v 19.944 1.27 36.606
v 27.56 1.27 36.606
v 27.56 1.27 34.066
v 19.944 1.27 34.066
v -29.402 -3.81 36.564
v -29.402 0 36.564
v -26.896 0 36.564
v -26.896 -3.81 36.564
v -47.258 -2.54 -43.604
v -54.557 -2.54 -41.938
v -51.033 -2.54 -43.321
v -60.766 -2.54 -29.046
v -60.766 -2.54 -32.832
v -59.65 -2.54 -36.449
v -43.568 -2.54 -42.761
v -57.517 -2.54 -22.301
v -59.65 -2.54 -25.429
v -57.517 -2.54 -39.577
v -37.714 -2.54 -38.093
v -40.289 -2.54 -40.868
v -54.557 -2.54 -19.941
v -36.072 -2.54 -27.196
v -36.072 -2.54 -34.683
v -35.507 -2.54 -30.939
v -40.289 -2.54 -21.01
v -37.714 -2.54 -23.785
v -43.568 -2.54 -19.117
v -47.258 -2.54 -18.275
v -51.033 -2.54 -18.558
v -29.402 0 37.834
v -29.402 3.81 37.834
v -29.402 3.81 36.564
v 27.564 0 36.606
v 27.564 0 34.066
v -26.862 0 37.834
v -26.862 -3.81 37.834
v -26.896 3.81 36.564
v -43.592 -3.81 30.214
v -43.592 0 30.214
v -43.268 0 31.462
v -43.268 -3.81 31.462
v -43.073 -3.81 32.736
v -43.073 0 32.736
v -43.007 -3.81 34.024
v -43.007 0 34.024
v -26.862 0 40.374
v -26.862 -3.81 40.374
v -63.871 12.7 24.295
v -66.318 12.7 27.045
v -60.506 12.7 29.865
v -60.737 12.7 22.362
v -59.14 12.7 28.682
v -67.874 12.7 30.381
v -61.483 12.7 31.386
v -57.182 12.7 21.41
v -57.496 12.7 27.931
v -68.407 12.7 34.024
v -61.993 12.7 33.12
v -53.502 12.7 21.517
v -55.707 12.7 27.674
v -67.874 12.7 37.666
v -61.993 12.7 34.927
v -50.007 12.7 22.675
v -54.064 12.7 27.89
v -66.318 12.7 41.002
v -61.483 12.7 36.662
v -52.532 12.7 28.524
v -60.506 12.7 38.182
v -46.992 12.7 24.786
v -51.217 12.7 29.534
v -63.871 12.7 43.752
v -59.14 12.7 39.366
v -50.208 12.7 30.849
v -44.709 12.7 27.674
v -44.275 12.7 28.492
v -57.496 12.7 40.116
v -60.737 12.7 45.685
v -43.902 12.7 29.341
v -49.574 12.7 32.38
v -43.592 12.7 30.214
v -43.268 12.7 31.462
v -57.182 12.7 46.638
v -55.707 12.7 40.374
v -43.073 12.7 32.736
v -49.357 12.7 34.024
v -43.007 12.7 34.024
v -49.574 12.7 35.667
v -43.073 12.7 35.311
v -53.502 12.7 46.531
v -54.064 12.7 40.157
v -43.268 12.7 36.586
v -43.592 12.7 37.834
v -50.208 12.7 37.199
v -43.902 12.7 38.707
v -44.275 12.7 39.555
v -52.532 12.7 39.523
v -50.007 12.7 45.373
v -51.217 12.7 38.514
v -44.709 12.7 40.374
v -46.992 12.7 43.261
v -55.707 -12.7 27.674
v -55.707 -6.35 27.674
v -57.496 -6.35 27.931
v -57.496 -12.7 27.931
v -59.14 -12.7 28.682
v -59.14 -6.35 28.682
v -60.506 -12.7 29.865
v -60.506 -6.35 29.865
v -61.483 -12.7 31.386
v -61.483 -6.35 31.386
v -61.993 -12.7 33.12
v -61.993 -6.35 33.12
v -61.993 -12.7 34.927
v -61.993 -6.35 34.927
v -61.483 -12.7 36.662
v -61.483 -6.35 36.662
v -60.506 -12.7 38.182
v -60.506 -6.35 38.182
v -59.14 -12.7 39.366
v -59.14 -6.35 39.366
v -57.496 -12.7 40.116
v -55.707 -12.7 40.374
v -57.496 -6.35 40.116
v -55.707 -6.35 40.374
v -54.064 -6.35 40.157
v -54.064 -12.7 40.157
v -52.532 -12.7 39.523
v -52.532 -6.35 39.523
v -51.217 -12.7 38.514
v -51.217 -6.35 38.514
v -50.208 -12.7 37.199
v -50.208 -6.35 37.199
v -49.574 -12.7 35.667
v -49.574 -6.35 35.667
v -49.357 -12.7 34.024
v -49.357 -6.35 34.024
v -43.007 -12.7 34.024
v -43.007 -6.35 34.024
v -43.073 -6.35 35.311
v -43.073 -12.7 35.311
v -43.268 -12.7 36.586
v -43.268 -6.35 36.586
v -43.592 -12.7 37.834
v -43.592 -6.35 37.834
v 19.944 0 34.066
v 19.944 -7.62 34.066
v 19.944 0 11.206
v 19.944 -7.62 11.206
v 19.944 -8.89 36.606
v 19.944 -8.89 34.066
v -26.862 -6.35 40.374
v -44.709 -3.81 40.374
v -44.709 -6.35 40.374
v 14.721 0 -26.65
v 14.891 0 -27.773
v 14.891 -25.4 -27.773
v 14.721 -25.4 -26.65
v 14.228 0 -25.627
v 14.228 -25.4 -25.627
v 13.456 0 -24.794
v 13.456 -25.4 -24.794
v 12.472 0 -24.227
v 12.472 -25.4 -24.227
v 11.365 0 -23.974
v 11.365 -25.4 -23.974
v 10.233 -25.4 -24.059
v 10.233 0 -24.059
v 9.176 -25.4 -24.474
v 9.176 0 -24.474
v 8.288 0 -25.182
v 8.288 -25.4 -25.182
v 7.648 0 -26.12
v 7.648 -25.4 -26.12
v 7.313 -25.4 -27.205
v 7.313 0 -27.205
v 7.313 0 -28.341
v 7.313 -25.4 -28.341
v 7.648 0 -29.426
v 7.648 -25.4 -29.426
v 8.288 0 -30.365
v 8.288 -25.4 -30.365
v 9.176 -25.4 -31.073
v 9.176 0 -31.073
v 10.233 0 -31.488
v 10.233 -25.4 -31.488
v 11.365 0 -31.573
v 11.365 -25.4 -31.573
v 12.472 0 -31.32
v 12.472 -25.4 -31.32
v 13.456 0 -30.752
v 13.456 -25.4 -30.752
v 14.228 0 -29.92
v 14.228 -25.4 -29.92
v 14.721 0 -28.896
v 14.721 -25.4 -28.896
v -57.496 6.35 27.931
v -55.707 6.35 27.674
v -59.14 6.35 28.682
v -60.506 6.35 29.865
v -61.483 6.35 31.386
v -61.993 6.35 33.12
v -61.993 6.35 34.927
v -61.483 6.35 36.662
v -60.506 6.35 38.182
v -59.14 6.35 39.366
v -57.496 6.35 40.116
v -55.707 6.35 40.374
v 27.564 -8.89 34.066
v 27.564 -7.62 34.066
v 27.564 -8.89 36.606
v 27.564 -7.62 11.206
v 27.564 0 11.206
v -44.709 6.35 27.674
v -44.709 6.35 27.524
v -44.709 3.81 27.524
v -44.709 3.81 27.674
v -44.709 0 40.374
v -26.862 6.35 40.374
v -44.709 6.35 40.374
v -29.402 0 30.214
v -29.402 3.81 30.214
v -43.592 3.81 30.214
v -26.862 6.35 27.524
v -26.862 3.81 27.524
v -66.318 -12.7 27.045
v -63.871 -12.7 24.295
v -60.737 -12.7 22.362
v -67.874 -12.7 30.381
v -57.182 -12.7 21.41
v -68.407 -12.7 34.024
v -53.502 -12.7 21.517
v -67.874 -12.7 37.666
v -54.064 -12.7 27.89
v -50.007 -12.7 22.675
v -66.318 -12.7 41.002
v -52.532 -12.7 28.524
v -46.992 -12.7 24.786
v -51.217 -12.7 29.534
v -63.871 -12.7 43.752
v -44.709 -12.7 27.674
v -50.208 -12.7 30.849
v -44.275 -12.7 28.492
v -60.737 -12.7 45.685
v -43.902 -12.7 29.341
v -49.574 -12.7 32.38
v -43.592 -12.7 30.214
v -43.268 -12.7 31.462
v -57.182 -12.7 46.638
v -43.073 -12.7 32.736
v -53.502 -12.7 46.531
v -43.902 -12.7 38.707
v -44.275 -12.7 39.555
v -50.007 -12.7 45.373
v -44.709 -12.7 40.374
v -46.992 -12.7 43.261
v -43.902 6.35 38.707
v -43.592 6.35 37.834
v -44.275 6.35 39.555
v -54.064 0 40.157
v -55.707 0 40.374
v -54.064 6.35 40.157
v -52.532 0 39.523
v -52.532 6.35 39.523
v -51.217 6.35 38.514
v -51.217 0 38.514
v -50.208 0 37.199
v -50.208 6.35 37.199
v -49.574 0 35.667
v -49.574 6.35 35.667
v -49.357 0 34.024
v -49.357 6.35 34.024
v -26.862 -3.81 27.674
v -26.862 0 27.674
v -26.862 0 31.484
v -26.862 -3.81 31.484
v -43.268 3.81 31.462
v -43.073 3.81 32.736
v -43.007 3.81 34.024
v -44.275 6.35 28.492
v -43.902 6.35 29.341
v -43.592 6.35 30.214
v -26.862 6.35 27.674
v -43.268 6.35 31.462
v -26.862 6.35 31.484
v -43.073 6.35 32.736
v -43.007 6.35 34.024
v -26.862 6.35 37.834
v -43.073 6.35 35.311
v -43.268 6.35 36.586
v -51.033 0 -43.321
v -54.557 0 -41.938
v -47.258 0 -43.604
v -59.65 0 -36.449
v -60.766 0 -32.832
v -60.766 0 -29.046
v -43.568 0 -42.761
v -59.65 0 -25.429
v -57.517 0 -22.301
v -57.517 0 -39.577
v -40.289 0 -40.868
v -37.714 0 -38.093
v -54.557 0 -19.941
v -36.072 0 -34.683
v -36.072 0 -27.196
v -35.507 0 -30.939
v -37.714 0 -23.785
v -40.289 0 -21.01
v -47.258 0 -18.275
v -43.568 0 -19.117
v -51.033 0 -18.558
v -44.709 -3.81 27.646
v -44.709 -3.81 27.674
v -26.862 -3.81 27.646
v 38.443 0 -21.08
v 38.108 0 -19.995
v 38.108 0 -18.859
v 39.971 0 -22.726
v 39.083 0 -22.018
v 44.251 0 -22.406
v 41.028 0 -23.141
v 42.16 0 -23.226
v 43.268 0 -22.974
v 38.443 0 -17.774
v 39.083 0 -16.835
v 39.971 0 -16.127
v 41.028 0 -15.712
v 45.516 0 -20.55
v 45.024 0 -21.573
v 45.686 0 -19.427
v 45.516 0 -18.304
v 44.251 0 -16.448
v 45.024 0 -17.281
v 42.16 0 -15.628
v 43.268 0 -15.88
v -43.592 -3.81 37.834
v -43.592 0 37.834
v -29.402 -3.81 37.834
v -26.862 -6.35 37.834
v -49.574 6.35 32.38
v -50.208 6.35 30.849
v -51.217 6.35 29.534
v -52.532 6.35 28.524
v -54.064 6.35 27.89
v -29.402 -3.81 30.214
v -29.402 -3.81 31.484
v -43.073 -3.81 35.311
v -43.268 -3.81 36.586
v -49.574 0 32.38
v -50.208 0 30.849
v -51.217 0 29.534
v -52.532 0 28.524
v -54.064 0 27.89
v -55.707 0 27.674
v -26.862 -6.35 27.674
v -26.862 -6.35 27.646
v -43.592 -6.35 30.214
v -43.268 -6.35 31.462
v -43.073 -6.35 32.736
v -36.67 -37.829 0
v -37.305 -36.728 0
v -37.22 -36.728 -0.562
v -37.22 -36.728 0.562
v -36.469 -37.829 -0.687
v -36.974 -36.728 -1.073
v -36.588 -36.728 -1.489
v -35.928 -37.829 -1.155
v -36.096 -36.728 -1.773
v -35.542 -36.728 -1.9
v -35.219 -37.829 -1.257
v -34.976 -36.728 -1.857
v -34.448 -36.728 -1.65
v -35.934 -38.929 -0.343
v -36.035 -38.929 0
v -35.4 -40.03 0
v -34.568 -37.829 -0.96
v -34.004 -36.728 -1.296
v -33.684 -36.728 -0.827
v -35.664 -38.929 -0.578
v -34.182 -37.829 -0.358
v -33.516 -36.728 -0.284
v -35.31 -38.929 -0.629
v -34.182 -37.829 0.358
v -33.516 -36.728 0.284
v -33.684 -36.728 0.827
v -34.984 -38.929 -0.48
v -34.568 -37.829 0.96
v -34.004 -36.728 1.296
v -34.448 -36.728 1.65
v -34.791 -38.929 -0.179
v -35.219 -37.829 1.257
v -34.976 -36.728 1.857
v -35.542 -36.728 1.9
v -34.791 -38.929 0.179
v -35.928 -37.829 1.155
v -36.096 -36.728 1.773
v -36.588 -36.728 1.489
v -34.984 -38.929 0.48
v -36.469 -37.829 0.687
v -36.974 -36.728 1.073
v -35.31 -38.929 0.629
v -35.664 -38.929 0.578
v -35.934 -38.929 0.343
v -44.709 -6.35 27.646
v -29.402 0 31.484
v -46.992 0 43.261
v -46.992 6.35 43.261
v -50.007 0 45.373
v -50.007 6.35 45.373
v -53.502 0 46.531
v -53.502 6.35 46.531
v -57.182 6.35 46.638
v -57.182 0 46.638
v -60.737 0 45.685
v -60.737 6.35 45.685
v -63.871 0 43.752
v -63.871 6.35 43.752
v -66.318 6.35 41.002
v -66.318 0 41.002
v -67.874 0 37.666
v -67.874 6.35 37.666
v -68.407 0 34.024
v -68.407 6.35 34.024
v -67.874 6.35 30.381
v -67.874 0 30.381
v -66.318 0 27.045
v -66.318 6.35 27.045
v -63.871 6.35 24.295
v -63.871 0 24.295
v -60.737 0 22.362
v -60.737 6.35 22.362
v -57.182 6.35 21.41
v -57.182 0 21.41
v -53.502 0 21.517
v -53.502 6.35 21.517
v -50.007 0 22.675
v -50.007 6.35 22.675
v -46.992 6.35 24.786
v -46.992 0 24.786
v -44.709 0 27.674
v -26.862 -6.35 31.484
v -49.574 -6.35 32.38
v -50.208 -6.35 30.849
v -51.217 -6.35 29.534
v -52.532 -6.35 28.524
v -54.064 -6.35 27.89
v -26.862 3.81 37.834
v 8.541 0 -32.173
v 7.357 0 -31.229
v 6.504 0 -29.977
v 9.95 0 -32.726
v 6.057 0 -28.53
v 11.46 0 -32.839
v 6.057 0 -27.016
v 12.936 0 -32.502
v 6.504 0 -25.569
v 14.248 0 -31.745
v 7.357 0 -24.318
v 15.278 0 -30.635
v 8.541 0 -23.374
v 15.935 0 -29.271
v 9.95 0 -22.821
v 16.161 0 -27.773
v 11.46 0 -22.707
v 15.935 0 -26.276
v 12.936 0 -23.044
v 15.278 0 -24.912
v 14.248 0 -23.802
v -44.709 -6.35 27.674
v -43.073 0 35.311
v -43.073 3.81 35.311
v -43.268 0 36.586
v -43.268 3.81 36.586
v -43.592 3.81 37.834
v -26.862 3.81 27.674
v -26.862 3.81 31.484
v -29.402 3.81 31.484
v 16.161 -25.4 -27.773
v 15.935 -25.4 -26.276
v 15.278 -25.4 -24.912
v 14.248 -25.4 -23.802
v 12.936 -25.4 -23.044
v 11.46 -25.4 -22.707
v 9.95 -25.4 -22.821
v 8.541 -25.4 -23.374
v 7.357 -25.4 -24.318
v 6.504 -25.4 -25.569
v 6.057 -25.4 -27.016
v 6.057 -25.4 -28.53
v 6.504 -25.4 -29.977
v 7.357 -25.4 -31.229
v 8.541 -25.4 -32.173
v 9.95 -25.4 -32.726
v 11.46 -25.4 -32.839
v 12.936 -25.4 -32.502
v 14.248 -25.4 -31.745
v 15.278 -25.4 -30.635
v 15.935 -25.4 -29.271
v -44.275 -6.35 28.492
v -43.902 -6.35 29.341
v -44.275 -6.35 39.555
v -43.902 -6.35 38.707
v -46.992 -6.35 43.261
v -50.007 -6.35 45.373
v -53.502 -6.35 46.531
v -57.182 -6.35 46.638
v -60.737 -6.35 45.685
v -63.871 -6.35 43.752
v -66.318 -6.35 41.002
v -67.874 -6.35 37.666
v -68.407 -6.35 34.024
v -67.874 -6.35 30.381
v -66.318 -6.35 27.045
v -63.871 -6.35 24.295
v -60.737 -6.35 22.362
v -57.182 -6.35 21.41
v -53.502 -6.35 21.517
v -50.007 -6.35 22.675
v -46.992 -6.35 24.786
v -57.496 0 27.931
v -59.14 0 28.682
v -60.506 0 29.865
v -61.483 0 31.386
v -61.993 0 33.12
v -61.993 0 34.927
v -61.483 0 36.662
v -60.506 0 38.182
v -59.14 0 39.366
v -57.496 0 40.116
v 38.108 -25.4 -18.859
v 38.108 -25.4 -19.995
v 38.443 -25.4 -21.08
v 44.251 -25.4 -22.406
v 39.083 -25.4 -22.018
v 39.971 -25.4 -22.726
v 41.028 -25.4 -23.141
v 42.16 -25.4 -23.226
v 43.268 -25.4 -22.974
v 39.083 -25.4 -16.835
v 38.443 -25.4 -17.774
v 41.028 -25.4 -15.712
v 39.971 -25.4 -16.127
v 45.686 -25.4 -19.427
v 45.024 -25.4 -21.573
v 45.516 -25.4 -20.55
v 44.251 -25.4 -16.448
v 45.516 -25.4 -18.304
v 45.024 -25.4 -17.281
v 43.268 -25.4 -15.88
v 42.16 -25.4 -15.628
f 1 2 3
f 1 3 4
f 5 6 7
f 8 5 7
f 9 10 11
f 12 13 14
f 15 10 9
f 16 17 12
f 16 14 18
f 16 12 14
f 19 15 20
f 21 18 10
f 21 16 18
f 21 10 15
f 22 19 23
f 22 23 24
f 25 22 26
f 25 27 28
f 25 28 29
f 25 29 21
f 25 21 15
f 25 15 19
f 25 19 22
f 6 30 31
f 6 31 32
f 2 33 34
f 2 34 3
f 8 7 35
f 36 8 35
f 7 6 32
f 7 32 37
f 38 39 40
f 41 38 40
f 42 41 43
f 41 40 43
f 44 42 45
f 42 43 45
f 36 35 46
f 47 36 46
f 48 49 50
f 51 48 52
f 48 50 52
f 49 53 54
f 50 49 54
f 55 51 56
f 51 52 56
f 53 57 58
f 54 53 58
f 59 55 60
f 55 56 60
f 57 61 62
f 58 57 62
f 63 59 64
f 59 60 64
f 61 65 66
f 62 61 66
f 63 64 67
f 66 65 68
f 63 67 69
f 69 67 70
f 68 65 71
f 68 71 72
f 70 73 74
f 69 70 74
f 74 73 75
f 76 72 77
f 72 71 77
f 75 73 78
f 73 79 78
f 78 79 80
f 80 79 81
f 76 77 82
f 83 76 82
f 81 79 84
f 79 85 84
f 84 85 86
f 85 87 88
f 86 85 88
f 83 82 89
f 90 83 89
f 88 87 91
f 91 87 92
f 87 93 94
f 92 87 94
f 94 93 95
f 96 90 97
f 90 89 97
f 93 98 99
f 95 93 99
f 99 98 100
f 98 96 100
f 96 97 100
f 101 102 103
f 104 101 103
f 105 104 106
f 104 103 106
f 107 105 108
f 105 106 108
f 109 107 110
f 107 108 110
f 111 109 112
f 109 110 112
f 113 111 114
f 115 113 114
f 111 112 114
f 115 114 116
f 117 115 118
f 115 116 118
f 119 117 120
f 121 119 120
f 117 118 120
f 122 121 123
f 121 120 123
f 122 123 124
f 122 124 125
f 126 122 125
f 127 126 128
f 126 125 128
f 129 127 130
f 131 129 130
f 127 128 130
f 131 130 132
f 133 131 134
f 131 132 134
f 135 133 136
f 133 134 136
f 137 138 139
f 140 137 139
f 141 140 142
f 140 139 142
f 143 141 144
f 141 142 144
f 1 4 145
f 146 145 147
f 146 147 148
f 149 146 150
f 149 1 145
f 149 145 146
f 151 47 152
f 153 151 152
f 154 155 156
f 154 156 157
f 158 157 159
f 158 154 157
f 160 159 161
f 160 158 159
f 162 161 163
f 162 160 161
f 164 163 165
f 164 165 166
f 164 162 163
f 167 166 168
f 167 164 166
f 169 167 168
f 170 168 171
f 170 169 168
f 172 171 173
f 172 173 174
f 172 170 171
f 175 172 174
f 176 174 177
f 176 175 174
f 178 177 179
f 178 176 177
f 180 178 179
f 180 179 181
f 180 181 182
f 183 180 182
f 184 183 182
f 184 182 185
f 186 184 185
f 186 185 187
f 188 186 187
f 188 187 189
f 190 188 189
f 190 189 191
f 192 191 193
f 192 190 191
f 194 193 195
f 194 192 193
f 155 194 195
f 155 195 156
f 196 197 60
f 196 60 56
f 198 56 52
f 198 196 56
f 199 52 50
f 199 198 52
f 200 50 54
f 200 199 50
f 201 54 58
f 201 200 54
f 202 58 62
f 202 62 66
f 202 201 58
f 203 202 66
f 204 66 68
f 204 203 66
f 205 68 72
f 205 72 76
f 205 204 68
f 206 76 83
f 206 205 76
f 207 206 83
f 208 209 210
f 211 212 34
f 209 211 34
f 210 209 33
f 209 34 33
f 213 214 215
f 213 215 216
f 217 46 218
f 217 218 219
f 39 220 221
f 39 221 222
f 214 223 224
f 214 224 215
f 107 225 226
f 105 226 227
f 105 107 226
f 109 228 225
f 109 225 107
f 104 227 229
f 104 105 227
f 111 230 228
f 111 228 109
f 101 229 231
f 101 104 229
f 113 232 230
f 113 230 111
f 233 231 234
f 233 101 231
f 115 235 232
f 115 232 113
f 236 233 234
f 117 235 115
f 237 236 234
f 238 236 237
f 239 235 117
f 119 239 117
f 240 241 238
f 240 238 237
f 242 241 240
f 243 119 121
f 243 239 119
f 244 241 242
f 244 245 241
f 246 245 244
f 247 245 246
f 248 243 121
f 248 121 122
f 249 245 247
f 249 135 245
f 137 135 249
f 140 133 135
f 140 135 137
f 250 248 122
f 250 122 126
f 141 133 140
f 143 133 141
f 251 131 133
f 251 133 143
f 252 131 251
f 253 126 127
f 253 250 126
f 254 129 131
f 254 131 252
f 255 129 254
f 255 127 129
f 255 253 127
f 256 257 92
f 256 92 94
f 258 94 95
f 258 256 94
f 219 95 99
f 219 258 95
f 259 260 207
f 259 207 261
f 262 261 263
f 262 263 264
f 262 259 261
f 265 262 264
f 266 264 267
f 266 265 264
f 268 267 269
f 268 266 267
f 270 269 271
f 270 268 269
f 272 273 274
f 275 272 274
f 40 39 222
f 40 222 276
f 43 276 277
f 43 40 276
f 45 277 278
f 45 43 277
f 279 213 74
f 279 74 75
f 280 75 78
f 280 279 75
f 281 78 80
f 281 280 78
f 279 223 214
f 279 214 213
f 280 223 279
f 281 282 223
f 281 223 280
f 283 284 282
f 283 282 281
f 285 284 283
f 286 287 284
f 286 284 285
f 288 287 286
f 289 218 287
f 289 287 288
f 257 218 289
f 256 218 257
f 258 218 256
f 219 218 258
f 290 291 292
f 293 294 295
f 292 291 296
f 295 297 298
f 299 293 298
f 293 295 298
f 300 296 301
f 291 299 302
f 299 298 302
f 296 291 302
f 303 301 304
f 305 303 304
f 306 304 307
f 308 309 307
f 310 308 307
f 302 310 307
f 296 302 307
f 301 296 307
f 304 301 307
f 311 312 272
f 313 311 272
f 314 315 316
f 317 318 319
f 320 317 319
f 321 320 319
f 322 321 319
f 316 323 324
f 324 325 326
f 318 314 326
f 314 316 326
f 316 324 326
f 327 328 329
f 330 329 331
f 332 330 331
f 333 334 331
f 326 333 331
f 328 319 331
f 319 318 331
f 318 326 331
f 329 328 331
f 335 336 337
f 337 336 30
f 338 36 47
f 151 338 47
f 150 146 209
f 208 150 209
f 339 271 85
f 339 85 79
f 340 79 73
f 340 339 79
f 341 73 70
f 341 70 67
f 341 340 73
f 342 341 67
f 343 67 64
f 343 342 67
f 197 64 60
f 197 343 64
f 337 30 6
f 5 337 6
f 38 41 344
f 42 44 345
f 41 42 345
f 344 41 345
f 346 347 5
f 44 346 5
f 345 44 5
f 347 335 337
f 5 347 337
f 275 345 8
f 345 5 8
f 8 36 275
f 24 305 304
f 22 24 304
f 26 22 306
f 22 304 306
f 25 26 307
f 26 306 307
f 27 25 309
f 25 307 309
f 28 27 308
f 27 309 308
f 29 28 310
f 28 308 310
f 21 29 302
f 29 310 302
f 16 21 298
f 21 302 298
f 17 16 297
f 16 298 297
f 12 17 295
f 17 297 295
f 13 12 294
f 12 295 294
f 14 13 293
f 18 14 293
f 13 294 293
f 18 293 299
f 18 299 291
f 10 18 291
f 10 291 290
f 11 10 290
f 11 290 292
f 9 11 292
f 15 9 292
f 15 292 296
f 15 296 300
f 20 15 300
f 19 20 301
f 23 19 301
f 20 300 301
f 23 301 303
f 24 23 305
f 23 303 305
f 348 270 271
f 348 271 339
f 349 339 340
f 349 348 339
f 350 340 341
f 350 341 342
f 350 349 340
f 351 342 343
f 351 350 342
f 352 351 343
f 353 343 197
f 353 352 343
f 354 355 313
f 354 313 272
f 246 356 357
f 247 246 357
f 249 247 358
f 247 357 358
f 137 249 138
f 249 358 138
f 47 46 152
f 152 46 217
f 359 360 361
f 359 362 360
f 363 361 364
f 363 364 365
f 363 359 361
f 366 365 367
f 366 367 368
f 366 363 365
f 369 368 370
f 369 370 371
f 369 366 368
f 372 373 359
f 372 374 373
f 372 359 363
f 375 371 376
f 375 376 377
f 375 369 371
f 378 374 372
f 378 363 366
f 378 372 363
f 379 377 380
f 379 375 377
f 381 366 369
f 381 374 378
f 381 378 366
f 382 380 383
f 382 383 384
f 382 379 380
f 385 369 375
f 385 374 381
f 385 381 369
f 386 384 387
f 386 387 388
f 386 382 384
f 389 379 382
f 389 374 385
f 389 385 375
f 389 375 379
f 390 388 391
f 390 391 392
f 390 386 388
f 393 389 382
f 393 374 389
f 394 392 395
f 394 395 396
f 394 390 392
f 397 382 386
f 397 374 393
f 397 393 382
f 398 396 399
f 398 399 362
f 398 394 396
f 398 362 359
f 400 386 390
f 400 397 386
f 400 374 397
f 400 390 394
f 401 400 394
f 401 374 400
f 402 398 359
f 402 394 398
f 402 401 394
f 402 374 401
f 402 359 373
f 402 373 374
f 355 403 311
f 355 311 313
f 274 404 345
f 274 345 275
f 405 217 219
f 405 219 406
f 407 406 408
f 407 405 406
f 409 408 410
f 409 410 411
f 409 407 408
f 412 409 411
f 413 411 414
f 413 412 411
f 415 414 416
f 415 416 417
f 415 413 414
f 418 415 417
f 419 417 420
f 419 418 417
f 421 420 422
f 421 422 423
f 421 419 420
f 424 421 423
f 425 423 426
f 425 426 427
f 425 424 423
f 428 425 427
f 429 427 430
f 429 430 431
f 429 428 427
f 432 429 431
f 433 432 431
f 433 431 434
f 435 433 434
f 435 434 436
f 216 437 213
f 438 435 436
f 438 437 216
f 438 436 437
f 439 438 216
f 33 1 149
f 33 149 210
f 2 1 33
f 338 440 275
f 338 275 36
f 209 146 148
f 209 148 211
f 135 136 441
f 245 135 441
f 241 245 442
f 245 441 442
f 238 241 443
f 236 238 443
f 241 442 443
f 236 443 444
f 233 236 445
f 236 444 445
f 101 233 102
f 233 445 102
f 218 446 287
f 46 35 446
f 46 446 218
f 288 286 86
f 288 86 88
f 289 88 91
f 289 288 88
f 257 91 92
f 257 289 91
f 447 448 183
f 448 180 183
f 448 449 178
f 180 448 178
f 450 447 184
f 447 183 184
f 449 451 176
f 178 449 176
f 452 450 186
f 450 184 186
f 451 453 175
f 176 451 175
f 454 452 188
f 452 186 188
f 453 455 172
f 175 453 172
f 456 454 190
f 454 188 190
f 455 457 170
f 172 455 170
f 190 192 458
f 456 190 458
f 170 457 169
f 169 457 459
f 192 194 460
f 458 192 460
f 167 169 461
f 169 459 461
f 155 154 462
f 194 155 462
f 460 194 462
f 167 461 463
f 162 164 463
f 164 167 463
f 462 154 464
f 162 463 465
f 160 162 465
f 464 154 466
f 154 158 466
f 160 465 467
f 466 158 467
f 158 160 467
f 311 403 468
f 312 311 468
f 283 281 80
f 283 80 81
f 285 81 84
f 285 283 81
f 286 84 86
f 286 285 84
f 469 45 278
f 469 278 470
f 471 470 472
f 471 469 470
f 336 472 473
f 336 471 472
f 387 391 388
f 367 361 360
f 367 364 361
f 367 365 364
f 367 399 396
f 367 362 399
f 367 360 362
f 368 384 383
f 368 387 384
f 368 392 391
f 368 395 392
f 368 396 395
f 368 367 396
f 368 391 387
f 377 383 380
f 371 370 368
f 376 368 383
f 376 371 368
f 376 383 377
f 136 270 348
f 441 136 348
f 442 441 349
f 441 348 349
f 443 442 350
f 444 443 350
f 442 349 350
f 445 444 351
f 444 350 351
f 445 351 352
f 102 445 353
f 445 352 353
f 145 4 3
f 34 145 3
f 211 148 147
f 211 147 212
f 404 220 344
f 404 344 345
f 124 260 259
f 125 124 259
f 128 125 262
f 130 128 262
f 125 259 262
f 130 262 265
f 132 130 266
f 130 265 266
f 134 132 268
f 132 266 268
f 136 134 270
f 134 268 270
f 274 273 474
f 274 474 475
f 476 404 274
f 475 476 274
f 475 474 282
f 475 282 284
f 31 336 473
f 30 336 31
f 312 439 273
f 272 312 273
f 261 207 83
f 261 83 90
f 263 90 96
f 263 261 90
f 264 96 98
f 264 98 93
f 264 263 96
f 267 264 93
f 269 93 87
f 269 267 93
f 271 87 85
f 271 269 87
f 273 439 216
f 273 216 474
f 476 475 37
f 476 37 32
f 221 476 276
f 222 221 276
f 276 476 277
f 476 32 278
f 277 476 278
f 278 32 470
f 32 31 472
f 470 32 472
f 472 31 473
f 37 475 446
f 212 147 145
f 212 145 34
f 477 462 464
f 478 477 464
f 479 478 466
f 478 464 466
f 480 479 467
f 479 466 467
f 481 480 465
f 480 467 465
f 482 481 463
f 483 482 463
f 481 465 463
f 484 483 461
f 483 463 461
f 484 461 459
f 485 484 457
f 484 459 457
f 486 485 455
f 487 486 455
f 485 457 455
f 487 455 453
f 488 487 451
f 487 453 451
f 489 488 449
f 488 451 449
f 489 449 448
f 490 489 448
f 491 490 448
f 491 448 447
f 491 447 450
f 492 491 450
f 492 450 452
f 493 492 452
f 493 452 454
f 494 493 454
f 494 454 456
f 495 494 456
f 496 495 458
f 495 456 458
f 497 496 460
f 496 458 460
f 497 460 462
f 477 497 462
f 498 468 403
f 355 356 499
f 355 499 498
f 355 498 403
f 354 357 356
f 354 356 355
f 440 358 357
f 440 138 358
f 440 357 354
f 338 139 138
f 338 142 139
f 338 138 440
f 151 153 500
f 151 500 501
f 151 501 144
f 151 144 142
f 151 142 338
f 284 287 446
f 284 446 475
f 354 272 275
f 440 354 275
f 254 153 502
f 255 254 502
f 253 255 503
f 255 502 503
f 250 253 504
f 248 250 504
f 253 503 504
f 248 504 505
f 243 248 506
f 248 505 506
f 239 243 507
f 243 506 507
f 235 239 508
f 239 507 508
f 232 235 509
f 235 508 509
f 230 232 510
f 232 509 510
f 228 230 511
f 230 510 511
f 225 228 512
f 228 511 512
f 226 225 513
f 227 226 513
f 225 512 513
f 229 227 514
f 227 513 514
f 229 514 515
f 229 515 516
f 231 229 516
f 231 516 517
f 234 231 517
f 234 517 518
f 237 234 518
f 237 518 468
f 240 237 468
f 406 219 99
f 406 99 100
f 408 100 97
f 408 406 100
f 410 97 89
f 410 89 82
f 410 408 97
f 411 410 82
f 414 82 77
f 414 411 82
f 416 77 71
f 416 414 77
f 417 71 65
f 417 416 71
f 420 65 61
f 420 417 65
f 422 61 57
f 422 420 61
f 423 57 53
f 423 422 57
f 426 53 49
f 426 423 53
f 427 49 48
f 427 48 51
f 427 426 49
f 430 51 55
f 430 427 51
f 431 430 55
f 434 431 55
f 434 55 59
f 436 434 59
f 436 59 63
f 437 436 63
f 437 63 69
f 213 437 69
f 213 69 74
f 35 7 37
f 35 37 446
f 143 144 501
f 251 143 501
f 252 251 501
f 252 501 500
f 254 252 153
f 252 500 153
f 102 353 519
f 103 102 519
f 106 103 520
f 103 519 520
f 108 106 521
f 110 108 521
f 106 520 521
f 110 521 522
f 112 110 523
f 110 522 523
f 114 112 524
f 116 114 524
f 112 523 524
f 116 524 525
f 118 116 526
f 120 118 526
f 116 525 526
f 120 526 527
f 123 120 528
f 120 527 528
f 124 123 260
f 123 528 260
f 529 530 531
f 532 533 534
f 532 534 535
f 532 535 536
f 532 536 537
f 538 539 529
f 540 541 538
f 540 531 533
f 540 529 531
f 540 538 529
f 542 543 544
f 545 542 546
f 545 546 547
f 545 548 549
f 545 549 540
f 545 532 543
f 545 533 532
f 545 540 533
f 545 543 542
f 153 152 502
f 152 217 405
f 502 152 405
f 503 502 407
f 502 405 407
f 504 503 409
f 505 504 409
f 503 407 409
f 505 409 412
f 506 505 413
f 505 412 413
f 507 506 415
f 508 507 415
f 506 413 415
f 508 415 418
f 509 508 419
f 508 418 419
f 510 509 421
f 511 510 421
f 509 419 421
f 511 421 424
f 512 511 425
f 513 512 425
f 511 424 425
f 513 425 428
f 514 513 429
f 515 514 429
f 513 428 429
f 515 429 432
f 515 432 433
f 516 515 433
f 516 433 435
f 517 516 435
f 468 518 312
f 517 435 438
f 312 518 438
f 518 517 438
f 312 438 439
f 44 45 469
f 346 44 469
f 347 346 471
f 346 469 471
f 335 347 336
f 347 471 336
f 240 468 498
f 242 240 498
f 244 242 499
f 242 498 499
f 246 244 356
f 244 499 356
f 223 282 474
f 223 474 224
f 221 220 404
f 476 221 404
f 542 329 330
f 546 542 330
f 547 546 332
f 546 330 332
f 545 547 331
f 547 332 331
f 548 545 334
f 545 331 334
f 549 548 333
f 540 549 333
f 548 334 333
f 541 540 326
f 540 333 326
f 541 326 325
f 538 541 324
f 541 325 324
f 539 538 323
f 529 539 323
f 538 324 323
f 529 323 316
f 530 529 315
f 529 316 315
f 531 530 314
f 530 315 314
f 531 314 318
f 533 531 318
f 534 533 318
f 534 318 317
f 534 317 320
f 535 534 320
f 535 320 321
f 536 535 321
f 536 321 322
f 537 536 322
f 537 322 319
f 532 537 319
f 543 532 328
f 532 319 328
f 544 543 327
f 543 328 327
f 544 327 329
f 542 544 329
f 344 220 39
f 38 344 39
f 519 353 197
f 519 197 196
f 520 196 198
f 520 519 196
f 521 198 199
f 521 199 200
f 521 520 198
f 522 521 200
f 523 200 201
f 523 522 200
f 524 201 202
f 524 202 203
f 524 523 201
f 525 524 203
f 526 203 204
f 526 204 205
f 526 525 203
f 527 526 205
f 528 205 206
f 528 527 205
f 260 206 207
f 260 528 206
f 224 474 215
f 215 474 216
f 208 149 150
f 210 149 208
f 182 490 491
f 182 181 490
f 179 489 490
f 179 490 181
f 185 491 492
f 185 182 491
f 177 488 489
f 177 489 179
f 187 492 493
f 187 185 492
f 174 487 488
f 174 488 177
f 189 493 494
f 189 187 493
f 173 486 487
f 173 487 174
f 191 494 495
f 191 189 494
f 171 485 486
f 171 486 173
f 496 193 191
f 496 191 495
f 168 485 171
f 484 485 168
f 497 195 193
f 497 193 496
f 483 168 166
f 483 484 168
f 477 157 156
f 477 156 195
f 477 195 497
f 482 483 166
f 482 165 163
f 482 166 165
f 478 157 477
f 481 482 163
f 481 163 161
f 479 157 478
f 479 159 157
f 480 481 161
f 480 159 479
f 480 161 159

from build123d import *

# Parameters (mm, degrees)
F1_DEPTH  = 12.7
F0_W      = 2.54
F0_H      = 1.27
F2_DEPTH  = 6.35
F3_W      = 17.8465797751
F3_H      = 12.7276986487
F4_DEPTH  = 2.54
F6_DEPTH  = 2.54
F7_W      = 7.62
F7_H      = 25.4
F8_DEPTH  = 7.62
F9_W      = 7.62
F9_H      = 1.27
F10_DEPTH = 2.54
F11_R     = 12.7
F12_DEPTH = 2.54
F13_R     = 5.08
F13_R_2   = 3.81
F14_DEPTH = 25.4
F15_R     = 3.81
F16_DEPTH = 25.4


with BuildPart() as f1:
    # F0 (on Front) → F1 (new body, symmetric)
    with BuildSketch(Plane.XZ):
        with BuildLine():
            ThreePointArc((-55.7071603835, 27.6736572362), (-62.0571603835, 34.0236572362), (-55.7071603835, 40.3736572362))
            Line((-55.7071603835, 40.3736572362), (-44.7086377554, 40.3736572362))
            ThreePointArc((-44.7086377554, 40.3736572362), (-68.4071603835, 34.0236572362), (-44.7086377554, 27.6736572362))
            Line((-44.7086377554, 27.6736572362), (-55.7071603835, 27.6736572362))
        make_face()
        with BuildLine():
            ThreePointArc((-55.7071603835, 40.3736572362), (-51.2170323229, 38.5137852967), (-49.3571603835, 34.0236572362))
            ThreePointArc((-49.3571603835, 34.0236572362), (-51.2170323229, 29.5335291756), (-55.7071603835, 27.6736572362))
            Line((-55.7071603835, 27.6736572362), (-44.7086377554, 27.6736572362))
            ThreePointArc((-44.7086377554, 27.6736572362), (-44.0808129769, 28.9130754707), (-43.5921325255, 30.2136572362))
            ThreePointArc((-43.5921325255, 30.2136572362), (-43.1542552656, 32.0963344553), (-43.0071603835, 34.0236572362))
            ThreePointArc((-43.0071603835, 34.0236572362), (-43.1542552656, 35.9509800171), (-43.5921325255, 37.8336572362))
            ThreePointArc((-43.5921325255, 37.8336572362), (-44.0808129769, 39.1342390017), (-44.7086377554, 40.3736572362))
            Line((-44.7086377554, 40.3736572362), (-55.7071603835, 40.3736572362))
        make_face()
    extrude(amount=F1_DEPTH, both=True)

    # F0 (on Front) → F2 (join, symmetric)
    with BuildSketch(Plane.XZ):
        with BuildLine():
            ThreePointArc((-55.7071603835, 40.3736572362), (-51.2170323229, 38.5137852967), (-49.3571603835, 34.0236572362))
            ThreePointArc((-49.3571603835, 34.0236572362), (-51.2170323229, 29.5335291756), (-55.7071603835, 27.6736572362))
            Line((-55.7071603835, 27.6736572362), (-44.7086377554, 27.6736572362))
            ThreePointArc((-44.7086377554, 27.6736572362), (-44.0808129769, 28.9130754707), (-43.5921325255, 30.2136572362))
            ThreePointArc((-43.5921325255, 30.2136572362), (-43.1542552656, 32.0963344553), (-43.0071603835, 34.0236572362))
            ThreePointArc((-43.0071603835, 34.0236572362), (-43.1542552656, 35.9509800171), (-43.5921325255, 37.8336572362))
            ThreePointArc((-43.5921325255, 37.8336572362), (-44.0808129769, 39.1342390017), (-44.7086377554, 40.3736572362))
            Line((-44.7086377554, 40.3736572362), (-55.7071603835, 40.3736572362))
        make_face()
        with BuildLine():
            ThreePointArc((-55.7071603835, 27.6736572362), (-62.0571603835, 34.0236572362), (-55.7071603835, 40.3736572362))
            Line((-55.7071603835, 40.3736572362), (-44.7086377554, 40.3736572362))
            ThreePointArc((-44.7086377554, 40.3736572362), (-68.4071603835, 34.0236572362), (-44.7086377554, 27.6736572362))
            Line((-44.7086377554, 27.6736572362), (-55.7071603835, 27.6736572362))
        make_face()
        with BuildLine():
            Line((-26.8620579803, 40.3736572362), (-44.7086377554, 40.3736572362))
            ThreePointArc((-44.7086377554, 40.3736572362), (-44.0808129769, 39.1342390017), (-43.5921325255, 37.8336572362))
            Line((-43.5921325255, 37.8336572362), (-29.4020579803, 37.8336572362))
            Line((-29.4020579803, 37.8336572362), (-26.8620579803, 37.8336572362))
            Line((-26.8620579803, 37.8336572362), (-26.8620579803, 40.3736572362))
        make_face()
        with BuildLine():
            ThreePointArc((-43.5921325255, 30.2136572362), (-44.0808129769, 28.9130754707), (-44.7086377554, 27.6736572362))
            Line((-44.7086377554, 27.6736572362), (-26.8620579803, 27.6736572362))
            Line((-26.8620579803, 27.6736572362), (-26.8620579803, 30.2136572362))
            Line((-26.8620579803, 30.2136572362), (-29.4020579803, 30.2136572362))
            Line((-29.4020579803, 30.2136572362), (-43.5921325255, 30.2136572362))
        make_face()
        Polygon((-26.8620579803, 37.8336572362), (-29.4020579803, 37.8336572362), (-29.4020579803, 36.5636572362), (-26.8964342725, 36.5641225693), align=None)
        with Locations((-28.1320579803, 30.8486572362)):
            Rectangle(F0_W, F0_H)
    extrude(amount=F2_DEPTH, both=True)

    # F3 (on face) → F4 (join)
    with BuildSketch(Plane.XZ.offset(6.35)):
        with Locations((-35.7853478678, 34.0098079119)):
            Rectangle(F3_W, F3_H)
    extrude(amount=-F4_DEPTH)

    # F5 (on face) → F6 (join)
    with BuildSketch(Plane(origin=(0, 6.35, 0), x_dir=(-1, 0, 0), z_dir=(0, 1, 0))):
        with BuildLine():
            Line((44.7086377554, 27.5241956115), (44.7086377554, 40.3736572362))
            ThreePointArc((44.7086377554, 40.3736572362), (44.0808129769, 39.1342390017), (43.5921325255, 37.8336572362))
            Line((43.5921325255, 37.8336572362), (29.4020579803, 37.8336572362))
            Line((29.4020579803, 37.8336572362), (29.4020579803, 36.5636572362))
            Line((29.4020579803, 36.5636572362), (26.8964342725, 36.5641225693))
            Line((26.8964342725, 36.5641225693), (26.8620579803, 37.8336572362))
            Line((26.8620579803, 37.8336572362), (26.8620579803, 27.5241956115))
            Line((26.8620579803, 27.5241956115), (44.7086377554, 27.5241956115))
        make_face()
    extrude(amount=-F6_DEPTH)


with BuildPart() as f8:
    # F7 (on Front) → F8 (new body)
    with BuildSketch(Plane.XZ):
        with Locations((23.7544238305, 23.9057886296)):
            Rectangle(F7_W, F7_H)
    extrude(amount=F8_DEPTH)

    # F9 (on face) → F10 (join)
    with BuildSketch(Plane.XY.offset(36.6057886296)):
        Polygon((19.9444238305, 1.27), (19.9444238305, 0), (27.5644238305, 0), (27.5596526358, 1.2699910376), align=None)
        with Locations((23.7544238305, -8.255)):
            Rectangle(F9_W, F9_H)
    extrude(amount=-F10_DEPTH)


with BuildPart() as f12:
    # F11 (on Front) → F12 (new body)
    with BuildSketch(Plane.XZ):
        with Locations((-48.2074655592, -30.9391189367)):
            Circle(F11_R)
    extrude(amount=F12_DEPTH)


with BuildPart() as f14:
    # F13 (on Front) → F14 (new body)
    with BuildSketch(Plane.XZ):
        with Locations((11.0805211589, -27.773257345)):
            Circle(F13_R)
        with Locations((11.0805211589, -27.773257345)):
            Circle(F13_R_2, mode=Mode.SUBTRACT)
    extrude(amount=F14_DEPTH)


with BuildPart() as f16:
    # F15 (on Front) → F16 (new body)
    with BuildSketch(Plane.XZ):
        with Locations((41.8757386506, -19.4268878549)):
            Circle(F15_R)
    extrude(amount=F16_DEPTH)


with BuildPart() as f18:
    # F17 (on Top) → F18 (revolve)
    with BuildSketch(Plane.XY):
        Polygon((-35.4001093656, -36.7281247626), (-37.3051093656, -36.7281247626), (-35.4001093656, -40.0301247626), align=None)
    revolve(axis=Axis((-35.4001093656, -38.3791247626, 0), (0, -1, 0)))


solid = Compound([f1.part, f8.part, f12.part, f14.part, f16.part, f18.part])
